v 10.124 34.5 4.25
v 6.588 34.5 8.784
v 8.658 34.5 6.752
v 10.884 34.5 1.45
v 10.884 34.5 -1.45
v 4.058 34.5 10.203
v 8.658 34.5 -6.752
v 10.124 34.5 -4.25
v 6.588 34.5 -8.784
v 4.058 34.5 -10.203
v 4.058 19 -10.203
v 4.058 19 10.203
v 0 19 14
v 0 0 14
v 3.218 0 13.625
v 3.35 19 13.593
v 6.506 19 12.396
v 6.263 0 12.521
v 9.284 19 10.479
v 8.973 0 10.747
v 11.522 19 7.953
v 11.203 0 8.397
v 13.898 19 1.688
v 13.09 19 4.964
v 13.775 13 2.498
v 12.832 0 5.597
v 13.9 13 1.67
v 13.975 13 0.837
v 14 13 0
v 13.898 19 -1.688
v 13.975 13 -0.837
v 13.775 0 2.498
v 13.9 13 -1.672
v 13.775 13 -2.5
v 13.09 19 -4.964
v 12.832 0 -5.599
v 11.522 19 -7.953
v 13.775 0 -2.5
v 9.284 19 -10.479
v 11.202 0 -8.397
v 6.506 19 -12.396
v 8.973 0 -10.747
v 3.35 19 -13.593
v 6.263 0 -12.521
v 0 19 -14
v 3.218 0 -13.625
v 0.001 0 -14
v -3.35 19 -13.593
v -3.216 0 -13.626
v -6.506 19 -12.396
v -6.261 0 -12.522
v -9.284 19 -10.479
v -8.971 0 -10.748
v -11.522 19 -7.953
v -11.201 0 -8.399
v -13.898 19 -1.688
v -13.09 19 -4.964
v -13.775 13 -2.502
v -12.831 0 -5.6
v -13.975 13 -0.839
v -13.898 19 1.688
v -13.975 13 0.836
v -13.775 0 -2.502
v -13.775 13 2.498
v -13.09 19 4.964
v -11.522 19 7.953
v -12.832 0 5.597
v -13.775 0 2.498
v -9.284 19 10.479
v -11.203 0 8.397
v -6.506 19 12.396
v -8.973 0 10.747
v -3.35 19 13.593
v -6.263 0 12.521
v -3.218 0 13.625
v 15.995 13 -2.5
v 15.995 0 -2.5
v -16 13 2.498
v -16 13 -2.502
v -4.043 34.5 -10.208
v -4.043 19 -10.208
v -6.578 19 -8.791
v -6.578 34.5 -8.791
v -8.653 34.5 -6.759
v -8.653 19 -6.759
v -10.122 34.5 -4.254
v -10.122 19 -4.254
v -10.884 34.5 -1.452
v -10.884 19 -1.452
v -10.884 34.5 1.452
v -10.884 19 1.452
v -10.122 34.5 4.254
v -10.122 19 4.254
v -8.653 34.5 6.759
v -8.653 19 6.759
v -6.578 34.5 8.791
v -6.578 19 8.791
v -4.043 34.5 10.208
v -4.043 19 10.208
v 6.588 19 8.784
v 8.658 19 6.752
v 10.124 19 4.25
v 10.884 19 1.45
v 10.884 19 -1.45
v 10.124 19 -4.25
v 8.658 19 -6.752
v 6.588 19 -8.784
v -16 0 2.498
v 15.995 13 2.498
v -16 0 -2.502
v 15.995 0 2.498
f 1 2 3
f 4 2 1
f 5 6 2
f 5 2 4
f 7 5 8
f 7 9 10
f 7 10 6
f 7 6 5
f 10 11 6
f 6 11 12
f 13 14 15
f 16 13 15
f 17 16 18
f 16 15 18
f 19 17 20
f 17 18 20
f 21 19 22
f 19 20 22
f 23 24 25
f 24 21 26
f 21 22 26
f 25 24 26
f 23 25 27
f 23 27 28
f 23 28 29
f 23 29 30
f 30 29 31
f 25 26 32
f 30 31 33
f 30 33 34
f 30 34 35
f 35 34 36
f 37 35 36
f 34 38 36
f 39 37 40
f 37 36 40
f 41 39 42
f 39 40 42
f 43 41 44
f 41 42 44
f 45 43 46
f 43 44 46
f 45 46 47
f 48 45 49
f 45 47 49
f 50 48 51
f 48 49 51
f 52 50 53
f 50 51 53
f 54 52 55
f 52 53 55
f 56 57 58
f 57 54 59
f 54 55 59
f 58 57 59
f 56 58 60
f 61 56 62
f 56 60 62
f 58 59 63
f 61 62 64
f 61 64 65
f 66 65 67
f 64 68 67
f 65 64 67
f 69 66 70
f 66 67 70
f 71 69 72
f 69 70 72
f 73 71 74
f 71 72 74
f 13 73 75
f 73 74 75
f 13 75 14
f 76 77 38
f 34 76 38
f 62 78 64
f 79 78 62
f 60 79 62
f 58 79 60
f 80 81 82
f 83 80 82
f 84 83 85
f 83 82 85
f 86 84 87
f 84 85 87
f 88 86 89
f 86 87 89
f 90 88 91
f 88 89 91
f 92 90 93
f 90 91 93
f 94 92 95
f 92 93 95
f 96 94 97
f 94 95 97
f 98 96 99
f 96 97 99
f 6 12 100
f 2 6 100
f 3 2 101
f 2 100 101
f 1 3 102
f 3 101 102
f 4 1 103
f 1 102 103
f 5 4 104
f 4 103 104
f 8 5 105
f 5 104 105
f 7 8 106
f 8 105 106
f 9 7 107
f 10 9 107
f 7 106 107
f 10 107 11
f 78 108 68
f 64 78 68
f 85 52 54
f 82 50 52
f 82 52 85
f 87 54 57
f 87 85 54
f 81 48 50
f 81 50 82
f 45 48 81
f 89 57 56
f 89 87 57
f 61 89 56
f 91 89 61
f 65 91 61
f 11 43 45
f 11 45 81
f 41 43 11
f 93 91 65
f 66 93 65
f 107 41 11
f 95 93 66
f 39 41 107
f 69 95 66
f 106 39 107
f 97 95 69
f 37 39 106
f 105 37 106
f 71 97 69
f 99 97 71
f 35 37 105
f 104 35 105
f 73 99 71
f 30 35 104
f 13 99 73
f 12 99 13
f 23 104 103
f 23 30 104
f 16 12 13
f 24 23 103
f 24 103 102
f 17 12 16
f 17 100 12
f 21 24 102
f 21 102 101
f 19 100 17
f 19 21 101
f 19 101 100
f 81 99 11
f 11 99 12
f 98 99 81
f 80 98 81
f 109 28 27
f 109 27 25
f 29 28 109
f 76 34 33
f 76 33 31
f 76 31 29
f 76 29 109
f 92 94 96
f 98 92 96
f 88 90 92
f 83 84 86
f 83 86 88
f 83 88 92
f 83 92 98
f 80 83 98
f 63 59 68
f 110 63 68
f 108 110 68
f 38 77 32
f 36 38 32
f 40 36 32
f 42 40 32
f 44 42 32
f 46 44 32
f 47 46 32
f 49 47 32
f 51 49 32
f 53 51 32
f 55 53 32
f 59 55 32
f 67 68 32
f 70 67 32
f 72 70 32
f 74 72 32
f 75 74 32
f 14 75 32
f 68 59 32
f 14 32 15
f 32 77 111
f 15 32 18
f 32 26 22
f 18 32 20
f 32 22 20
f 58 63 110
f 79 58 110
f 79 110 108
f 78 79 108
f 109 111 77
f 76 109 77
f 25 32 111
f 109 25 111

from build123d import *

# Parameters (mm, degrees)
BOSS_EXTRUDE1_DEPTH   = 34.5
BOSS_EXTRUDE1_2_DEPTH = 34.5
SKETCH1_4_R           = 14
BOSS_EXTRUDE2_DEPTH   = 19
BOSS_EXTRUDE3_DEPTH   = 13


with BuildPart() as part:
    # Sketch1 → Boss-Extrude1 (new body)
    with BuildSketch(Plane(origin=(0, 0, 0), x_dir=(1, 0, 0), z_dir=(0, 1, 0))):
        with BuildLine():
            ThreePointArc((4.058218824, -10.202512434), (10.98, 0), (4.058218824, 10.202512434))
            Line((4.058218824, 10.202512434), (4.058218824, -10.202512434))
        make_face()
    extrude(amount=BOSS_EXTRUDE1_DEPTH)



with BuildPart() as body_2:
    # Sketch1 → Boss-Extrude1 2 (new body)
    with BuildSketch(Plane(origin=(0, 0, 0), x_dir=(1, 0, 0), z_dir=(0, 1, 0))):
        with BuildLine():
            Line((-4.043488658, -10.208359294), (-4.043488658, 10.208359294))
            ThreePointArc((-4.043488658, 10.208359294), (-10.98, 0), (-4.043488658, -10.208359294))
        make_face()
    extrude(amount=BOSS_EXTRUDE1_2_DEPTH)


with BuildPart() as part_1:
    add(part.part)

    add(body_2.part)  # Boss-Extrude2 merges body 2
    # Sketch1<4> → Boss-Extrude2 (add)
    with BuildSketch(Plane(origin=(0, 0, 0), x_dir=(1, 0, 0), z_dir=(0, 1, 0))):
        Circle(SKETCH1_4_R)
        with BuildLine():
            Line((-4.043488658, 2.501755217), (-4.043488658, -10.208359294))
            ThreePointArc((-4.043488658, -10.208359294), (-4.044654217, -10.207897544), (-4.045819724, -10.20743566))
            ThreePointArc((-4.045819724, -10.20743566), (-10.979999928, 0.001253691), (-4.043488658, 10.208359294))
            Line((-4.043488658, 10.208359294), (-4.043488658, 2.501755217))
        make_face(mode=Mode.SUBTRACT)
        with BuildLine():
            Line((4.058218824, 2.5), (4.058218824, 10.202512434))
            ThreePointArc((4.058218824, 10.202512434), (10.98, 0), (4.058218824, -10.202512434))
            Line((4.058218824, -10.202512434), (4.058218824, 2.5))
        make_face(mode=Mode.SUBTRACT)
    extrude(amount=BOSS_EXTRUDE2_DEPTH)

    # Sketch1<5> → Boss-Extrude3 (add)
    with BuildSketch(Plane(origin=(0, 0, 0), x_dir=(1, 0, 0), z_dir=(0, 1, 0))):
        with BuildLine():
            ThreePointArc((13.774977314, 2.5), (13.999999972, 0.000891934), (13.77529575, -2.498244783))
            Line((13.77529575, -2.498244783), (15.995322261, -2.498244783))
            Line((15.995322261, -2.498244783), (15.995322261, 2.5))
            Line((15.995322261, 2.5), (13.774977314, 2.5))
        make_face()
        with BuildLine():
            Line((-16, -2.498244783), (-13.77529575, -2.498244783))
            ThreePointArc((-13.77529575, -2.498244783), (-13.999999886, 0.001783889), (-13.774658647, 2.501755217))
            Line((-13.774658647, 2.501755217), (-16, 2.501755217))
            Line((-16, 2.501755217), (-16, -2.498244783))
        make_face()
    extrude(amount=BOSS_EXTRUDE3_DEPTH)


solid = part_1.part
